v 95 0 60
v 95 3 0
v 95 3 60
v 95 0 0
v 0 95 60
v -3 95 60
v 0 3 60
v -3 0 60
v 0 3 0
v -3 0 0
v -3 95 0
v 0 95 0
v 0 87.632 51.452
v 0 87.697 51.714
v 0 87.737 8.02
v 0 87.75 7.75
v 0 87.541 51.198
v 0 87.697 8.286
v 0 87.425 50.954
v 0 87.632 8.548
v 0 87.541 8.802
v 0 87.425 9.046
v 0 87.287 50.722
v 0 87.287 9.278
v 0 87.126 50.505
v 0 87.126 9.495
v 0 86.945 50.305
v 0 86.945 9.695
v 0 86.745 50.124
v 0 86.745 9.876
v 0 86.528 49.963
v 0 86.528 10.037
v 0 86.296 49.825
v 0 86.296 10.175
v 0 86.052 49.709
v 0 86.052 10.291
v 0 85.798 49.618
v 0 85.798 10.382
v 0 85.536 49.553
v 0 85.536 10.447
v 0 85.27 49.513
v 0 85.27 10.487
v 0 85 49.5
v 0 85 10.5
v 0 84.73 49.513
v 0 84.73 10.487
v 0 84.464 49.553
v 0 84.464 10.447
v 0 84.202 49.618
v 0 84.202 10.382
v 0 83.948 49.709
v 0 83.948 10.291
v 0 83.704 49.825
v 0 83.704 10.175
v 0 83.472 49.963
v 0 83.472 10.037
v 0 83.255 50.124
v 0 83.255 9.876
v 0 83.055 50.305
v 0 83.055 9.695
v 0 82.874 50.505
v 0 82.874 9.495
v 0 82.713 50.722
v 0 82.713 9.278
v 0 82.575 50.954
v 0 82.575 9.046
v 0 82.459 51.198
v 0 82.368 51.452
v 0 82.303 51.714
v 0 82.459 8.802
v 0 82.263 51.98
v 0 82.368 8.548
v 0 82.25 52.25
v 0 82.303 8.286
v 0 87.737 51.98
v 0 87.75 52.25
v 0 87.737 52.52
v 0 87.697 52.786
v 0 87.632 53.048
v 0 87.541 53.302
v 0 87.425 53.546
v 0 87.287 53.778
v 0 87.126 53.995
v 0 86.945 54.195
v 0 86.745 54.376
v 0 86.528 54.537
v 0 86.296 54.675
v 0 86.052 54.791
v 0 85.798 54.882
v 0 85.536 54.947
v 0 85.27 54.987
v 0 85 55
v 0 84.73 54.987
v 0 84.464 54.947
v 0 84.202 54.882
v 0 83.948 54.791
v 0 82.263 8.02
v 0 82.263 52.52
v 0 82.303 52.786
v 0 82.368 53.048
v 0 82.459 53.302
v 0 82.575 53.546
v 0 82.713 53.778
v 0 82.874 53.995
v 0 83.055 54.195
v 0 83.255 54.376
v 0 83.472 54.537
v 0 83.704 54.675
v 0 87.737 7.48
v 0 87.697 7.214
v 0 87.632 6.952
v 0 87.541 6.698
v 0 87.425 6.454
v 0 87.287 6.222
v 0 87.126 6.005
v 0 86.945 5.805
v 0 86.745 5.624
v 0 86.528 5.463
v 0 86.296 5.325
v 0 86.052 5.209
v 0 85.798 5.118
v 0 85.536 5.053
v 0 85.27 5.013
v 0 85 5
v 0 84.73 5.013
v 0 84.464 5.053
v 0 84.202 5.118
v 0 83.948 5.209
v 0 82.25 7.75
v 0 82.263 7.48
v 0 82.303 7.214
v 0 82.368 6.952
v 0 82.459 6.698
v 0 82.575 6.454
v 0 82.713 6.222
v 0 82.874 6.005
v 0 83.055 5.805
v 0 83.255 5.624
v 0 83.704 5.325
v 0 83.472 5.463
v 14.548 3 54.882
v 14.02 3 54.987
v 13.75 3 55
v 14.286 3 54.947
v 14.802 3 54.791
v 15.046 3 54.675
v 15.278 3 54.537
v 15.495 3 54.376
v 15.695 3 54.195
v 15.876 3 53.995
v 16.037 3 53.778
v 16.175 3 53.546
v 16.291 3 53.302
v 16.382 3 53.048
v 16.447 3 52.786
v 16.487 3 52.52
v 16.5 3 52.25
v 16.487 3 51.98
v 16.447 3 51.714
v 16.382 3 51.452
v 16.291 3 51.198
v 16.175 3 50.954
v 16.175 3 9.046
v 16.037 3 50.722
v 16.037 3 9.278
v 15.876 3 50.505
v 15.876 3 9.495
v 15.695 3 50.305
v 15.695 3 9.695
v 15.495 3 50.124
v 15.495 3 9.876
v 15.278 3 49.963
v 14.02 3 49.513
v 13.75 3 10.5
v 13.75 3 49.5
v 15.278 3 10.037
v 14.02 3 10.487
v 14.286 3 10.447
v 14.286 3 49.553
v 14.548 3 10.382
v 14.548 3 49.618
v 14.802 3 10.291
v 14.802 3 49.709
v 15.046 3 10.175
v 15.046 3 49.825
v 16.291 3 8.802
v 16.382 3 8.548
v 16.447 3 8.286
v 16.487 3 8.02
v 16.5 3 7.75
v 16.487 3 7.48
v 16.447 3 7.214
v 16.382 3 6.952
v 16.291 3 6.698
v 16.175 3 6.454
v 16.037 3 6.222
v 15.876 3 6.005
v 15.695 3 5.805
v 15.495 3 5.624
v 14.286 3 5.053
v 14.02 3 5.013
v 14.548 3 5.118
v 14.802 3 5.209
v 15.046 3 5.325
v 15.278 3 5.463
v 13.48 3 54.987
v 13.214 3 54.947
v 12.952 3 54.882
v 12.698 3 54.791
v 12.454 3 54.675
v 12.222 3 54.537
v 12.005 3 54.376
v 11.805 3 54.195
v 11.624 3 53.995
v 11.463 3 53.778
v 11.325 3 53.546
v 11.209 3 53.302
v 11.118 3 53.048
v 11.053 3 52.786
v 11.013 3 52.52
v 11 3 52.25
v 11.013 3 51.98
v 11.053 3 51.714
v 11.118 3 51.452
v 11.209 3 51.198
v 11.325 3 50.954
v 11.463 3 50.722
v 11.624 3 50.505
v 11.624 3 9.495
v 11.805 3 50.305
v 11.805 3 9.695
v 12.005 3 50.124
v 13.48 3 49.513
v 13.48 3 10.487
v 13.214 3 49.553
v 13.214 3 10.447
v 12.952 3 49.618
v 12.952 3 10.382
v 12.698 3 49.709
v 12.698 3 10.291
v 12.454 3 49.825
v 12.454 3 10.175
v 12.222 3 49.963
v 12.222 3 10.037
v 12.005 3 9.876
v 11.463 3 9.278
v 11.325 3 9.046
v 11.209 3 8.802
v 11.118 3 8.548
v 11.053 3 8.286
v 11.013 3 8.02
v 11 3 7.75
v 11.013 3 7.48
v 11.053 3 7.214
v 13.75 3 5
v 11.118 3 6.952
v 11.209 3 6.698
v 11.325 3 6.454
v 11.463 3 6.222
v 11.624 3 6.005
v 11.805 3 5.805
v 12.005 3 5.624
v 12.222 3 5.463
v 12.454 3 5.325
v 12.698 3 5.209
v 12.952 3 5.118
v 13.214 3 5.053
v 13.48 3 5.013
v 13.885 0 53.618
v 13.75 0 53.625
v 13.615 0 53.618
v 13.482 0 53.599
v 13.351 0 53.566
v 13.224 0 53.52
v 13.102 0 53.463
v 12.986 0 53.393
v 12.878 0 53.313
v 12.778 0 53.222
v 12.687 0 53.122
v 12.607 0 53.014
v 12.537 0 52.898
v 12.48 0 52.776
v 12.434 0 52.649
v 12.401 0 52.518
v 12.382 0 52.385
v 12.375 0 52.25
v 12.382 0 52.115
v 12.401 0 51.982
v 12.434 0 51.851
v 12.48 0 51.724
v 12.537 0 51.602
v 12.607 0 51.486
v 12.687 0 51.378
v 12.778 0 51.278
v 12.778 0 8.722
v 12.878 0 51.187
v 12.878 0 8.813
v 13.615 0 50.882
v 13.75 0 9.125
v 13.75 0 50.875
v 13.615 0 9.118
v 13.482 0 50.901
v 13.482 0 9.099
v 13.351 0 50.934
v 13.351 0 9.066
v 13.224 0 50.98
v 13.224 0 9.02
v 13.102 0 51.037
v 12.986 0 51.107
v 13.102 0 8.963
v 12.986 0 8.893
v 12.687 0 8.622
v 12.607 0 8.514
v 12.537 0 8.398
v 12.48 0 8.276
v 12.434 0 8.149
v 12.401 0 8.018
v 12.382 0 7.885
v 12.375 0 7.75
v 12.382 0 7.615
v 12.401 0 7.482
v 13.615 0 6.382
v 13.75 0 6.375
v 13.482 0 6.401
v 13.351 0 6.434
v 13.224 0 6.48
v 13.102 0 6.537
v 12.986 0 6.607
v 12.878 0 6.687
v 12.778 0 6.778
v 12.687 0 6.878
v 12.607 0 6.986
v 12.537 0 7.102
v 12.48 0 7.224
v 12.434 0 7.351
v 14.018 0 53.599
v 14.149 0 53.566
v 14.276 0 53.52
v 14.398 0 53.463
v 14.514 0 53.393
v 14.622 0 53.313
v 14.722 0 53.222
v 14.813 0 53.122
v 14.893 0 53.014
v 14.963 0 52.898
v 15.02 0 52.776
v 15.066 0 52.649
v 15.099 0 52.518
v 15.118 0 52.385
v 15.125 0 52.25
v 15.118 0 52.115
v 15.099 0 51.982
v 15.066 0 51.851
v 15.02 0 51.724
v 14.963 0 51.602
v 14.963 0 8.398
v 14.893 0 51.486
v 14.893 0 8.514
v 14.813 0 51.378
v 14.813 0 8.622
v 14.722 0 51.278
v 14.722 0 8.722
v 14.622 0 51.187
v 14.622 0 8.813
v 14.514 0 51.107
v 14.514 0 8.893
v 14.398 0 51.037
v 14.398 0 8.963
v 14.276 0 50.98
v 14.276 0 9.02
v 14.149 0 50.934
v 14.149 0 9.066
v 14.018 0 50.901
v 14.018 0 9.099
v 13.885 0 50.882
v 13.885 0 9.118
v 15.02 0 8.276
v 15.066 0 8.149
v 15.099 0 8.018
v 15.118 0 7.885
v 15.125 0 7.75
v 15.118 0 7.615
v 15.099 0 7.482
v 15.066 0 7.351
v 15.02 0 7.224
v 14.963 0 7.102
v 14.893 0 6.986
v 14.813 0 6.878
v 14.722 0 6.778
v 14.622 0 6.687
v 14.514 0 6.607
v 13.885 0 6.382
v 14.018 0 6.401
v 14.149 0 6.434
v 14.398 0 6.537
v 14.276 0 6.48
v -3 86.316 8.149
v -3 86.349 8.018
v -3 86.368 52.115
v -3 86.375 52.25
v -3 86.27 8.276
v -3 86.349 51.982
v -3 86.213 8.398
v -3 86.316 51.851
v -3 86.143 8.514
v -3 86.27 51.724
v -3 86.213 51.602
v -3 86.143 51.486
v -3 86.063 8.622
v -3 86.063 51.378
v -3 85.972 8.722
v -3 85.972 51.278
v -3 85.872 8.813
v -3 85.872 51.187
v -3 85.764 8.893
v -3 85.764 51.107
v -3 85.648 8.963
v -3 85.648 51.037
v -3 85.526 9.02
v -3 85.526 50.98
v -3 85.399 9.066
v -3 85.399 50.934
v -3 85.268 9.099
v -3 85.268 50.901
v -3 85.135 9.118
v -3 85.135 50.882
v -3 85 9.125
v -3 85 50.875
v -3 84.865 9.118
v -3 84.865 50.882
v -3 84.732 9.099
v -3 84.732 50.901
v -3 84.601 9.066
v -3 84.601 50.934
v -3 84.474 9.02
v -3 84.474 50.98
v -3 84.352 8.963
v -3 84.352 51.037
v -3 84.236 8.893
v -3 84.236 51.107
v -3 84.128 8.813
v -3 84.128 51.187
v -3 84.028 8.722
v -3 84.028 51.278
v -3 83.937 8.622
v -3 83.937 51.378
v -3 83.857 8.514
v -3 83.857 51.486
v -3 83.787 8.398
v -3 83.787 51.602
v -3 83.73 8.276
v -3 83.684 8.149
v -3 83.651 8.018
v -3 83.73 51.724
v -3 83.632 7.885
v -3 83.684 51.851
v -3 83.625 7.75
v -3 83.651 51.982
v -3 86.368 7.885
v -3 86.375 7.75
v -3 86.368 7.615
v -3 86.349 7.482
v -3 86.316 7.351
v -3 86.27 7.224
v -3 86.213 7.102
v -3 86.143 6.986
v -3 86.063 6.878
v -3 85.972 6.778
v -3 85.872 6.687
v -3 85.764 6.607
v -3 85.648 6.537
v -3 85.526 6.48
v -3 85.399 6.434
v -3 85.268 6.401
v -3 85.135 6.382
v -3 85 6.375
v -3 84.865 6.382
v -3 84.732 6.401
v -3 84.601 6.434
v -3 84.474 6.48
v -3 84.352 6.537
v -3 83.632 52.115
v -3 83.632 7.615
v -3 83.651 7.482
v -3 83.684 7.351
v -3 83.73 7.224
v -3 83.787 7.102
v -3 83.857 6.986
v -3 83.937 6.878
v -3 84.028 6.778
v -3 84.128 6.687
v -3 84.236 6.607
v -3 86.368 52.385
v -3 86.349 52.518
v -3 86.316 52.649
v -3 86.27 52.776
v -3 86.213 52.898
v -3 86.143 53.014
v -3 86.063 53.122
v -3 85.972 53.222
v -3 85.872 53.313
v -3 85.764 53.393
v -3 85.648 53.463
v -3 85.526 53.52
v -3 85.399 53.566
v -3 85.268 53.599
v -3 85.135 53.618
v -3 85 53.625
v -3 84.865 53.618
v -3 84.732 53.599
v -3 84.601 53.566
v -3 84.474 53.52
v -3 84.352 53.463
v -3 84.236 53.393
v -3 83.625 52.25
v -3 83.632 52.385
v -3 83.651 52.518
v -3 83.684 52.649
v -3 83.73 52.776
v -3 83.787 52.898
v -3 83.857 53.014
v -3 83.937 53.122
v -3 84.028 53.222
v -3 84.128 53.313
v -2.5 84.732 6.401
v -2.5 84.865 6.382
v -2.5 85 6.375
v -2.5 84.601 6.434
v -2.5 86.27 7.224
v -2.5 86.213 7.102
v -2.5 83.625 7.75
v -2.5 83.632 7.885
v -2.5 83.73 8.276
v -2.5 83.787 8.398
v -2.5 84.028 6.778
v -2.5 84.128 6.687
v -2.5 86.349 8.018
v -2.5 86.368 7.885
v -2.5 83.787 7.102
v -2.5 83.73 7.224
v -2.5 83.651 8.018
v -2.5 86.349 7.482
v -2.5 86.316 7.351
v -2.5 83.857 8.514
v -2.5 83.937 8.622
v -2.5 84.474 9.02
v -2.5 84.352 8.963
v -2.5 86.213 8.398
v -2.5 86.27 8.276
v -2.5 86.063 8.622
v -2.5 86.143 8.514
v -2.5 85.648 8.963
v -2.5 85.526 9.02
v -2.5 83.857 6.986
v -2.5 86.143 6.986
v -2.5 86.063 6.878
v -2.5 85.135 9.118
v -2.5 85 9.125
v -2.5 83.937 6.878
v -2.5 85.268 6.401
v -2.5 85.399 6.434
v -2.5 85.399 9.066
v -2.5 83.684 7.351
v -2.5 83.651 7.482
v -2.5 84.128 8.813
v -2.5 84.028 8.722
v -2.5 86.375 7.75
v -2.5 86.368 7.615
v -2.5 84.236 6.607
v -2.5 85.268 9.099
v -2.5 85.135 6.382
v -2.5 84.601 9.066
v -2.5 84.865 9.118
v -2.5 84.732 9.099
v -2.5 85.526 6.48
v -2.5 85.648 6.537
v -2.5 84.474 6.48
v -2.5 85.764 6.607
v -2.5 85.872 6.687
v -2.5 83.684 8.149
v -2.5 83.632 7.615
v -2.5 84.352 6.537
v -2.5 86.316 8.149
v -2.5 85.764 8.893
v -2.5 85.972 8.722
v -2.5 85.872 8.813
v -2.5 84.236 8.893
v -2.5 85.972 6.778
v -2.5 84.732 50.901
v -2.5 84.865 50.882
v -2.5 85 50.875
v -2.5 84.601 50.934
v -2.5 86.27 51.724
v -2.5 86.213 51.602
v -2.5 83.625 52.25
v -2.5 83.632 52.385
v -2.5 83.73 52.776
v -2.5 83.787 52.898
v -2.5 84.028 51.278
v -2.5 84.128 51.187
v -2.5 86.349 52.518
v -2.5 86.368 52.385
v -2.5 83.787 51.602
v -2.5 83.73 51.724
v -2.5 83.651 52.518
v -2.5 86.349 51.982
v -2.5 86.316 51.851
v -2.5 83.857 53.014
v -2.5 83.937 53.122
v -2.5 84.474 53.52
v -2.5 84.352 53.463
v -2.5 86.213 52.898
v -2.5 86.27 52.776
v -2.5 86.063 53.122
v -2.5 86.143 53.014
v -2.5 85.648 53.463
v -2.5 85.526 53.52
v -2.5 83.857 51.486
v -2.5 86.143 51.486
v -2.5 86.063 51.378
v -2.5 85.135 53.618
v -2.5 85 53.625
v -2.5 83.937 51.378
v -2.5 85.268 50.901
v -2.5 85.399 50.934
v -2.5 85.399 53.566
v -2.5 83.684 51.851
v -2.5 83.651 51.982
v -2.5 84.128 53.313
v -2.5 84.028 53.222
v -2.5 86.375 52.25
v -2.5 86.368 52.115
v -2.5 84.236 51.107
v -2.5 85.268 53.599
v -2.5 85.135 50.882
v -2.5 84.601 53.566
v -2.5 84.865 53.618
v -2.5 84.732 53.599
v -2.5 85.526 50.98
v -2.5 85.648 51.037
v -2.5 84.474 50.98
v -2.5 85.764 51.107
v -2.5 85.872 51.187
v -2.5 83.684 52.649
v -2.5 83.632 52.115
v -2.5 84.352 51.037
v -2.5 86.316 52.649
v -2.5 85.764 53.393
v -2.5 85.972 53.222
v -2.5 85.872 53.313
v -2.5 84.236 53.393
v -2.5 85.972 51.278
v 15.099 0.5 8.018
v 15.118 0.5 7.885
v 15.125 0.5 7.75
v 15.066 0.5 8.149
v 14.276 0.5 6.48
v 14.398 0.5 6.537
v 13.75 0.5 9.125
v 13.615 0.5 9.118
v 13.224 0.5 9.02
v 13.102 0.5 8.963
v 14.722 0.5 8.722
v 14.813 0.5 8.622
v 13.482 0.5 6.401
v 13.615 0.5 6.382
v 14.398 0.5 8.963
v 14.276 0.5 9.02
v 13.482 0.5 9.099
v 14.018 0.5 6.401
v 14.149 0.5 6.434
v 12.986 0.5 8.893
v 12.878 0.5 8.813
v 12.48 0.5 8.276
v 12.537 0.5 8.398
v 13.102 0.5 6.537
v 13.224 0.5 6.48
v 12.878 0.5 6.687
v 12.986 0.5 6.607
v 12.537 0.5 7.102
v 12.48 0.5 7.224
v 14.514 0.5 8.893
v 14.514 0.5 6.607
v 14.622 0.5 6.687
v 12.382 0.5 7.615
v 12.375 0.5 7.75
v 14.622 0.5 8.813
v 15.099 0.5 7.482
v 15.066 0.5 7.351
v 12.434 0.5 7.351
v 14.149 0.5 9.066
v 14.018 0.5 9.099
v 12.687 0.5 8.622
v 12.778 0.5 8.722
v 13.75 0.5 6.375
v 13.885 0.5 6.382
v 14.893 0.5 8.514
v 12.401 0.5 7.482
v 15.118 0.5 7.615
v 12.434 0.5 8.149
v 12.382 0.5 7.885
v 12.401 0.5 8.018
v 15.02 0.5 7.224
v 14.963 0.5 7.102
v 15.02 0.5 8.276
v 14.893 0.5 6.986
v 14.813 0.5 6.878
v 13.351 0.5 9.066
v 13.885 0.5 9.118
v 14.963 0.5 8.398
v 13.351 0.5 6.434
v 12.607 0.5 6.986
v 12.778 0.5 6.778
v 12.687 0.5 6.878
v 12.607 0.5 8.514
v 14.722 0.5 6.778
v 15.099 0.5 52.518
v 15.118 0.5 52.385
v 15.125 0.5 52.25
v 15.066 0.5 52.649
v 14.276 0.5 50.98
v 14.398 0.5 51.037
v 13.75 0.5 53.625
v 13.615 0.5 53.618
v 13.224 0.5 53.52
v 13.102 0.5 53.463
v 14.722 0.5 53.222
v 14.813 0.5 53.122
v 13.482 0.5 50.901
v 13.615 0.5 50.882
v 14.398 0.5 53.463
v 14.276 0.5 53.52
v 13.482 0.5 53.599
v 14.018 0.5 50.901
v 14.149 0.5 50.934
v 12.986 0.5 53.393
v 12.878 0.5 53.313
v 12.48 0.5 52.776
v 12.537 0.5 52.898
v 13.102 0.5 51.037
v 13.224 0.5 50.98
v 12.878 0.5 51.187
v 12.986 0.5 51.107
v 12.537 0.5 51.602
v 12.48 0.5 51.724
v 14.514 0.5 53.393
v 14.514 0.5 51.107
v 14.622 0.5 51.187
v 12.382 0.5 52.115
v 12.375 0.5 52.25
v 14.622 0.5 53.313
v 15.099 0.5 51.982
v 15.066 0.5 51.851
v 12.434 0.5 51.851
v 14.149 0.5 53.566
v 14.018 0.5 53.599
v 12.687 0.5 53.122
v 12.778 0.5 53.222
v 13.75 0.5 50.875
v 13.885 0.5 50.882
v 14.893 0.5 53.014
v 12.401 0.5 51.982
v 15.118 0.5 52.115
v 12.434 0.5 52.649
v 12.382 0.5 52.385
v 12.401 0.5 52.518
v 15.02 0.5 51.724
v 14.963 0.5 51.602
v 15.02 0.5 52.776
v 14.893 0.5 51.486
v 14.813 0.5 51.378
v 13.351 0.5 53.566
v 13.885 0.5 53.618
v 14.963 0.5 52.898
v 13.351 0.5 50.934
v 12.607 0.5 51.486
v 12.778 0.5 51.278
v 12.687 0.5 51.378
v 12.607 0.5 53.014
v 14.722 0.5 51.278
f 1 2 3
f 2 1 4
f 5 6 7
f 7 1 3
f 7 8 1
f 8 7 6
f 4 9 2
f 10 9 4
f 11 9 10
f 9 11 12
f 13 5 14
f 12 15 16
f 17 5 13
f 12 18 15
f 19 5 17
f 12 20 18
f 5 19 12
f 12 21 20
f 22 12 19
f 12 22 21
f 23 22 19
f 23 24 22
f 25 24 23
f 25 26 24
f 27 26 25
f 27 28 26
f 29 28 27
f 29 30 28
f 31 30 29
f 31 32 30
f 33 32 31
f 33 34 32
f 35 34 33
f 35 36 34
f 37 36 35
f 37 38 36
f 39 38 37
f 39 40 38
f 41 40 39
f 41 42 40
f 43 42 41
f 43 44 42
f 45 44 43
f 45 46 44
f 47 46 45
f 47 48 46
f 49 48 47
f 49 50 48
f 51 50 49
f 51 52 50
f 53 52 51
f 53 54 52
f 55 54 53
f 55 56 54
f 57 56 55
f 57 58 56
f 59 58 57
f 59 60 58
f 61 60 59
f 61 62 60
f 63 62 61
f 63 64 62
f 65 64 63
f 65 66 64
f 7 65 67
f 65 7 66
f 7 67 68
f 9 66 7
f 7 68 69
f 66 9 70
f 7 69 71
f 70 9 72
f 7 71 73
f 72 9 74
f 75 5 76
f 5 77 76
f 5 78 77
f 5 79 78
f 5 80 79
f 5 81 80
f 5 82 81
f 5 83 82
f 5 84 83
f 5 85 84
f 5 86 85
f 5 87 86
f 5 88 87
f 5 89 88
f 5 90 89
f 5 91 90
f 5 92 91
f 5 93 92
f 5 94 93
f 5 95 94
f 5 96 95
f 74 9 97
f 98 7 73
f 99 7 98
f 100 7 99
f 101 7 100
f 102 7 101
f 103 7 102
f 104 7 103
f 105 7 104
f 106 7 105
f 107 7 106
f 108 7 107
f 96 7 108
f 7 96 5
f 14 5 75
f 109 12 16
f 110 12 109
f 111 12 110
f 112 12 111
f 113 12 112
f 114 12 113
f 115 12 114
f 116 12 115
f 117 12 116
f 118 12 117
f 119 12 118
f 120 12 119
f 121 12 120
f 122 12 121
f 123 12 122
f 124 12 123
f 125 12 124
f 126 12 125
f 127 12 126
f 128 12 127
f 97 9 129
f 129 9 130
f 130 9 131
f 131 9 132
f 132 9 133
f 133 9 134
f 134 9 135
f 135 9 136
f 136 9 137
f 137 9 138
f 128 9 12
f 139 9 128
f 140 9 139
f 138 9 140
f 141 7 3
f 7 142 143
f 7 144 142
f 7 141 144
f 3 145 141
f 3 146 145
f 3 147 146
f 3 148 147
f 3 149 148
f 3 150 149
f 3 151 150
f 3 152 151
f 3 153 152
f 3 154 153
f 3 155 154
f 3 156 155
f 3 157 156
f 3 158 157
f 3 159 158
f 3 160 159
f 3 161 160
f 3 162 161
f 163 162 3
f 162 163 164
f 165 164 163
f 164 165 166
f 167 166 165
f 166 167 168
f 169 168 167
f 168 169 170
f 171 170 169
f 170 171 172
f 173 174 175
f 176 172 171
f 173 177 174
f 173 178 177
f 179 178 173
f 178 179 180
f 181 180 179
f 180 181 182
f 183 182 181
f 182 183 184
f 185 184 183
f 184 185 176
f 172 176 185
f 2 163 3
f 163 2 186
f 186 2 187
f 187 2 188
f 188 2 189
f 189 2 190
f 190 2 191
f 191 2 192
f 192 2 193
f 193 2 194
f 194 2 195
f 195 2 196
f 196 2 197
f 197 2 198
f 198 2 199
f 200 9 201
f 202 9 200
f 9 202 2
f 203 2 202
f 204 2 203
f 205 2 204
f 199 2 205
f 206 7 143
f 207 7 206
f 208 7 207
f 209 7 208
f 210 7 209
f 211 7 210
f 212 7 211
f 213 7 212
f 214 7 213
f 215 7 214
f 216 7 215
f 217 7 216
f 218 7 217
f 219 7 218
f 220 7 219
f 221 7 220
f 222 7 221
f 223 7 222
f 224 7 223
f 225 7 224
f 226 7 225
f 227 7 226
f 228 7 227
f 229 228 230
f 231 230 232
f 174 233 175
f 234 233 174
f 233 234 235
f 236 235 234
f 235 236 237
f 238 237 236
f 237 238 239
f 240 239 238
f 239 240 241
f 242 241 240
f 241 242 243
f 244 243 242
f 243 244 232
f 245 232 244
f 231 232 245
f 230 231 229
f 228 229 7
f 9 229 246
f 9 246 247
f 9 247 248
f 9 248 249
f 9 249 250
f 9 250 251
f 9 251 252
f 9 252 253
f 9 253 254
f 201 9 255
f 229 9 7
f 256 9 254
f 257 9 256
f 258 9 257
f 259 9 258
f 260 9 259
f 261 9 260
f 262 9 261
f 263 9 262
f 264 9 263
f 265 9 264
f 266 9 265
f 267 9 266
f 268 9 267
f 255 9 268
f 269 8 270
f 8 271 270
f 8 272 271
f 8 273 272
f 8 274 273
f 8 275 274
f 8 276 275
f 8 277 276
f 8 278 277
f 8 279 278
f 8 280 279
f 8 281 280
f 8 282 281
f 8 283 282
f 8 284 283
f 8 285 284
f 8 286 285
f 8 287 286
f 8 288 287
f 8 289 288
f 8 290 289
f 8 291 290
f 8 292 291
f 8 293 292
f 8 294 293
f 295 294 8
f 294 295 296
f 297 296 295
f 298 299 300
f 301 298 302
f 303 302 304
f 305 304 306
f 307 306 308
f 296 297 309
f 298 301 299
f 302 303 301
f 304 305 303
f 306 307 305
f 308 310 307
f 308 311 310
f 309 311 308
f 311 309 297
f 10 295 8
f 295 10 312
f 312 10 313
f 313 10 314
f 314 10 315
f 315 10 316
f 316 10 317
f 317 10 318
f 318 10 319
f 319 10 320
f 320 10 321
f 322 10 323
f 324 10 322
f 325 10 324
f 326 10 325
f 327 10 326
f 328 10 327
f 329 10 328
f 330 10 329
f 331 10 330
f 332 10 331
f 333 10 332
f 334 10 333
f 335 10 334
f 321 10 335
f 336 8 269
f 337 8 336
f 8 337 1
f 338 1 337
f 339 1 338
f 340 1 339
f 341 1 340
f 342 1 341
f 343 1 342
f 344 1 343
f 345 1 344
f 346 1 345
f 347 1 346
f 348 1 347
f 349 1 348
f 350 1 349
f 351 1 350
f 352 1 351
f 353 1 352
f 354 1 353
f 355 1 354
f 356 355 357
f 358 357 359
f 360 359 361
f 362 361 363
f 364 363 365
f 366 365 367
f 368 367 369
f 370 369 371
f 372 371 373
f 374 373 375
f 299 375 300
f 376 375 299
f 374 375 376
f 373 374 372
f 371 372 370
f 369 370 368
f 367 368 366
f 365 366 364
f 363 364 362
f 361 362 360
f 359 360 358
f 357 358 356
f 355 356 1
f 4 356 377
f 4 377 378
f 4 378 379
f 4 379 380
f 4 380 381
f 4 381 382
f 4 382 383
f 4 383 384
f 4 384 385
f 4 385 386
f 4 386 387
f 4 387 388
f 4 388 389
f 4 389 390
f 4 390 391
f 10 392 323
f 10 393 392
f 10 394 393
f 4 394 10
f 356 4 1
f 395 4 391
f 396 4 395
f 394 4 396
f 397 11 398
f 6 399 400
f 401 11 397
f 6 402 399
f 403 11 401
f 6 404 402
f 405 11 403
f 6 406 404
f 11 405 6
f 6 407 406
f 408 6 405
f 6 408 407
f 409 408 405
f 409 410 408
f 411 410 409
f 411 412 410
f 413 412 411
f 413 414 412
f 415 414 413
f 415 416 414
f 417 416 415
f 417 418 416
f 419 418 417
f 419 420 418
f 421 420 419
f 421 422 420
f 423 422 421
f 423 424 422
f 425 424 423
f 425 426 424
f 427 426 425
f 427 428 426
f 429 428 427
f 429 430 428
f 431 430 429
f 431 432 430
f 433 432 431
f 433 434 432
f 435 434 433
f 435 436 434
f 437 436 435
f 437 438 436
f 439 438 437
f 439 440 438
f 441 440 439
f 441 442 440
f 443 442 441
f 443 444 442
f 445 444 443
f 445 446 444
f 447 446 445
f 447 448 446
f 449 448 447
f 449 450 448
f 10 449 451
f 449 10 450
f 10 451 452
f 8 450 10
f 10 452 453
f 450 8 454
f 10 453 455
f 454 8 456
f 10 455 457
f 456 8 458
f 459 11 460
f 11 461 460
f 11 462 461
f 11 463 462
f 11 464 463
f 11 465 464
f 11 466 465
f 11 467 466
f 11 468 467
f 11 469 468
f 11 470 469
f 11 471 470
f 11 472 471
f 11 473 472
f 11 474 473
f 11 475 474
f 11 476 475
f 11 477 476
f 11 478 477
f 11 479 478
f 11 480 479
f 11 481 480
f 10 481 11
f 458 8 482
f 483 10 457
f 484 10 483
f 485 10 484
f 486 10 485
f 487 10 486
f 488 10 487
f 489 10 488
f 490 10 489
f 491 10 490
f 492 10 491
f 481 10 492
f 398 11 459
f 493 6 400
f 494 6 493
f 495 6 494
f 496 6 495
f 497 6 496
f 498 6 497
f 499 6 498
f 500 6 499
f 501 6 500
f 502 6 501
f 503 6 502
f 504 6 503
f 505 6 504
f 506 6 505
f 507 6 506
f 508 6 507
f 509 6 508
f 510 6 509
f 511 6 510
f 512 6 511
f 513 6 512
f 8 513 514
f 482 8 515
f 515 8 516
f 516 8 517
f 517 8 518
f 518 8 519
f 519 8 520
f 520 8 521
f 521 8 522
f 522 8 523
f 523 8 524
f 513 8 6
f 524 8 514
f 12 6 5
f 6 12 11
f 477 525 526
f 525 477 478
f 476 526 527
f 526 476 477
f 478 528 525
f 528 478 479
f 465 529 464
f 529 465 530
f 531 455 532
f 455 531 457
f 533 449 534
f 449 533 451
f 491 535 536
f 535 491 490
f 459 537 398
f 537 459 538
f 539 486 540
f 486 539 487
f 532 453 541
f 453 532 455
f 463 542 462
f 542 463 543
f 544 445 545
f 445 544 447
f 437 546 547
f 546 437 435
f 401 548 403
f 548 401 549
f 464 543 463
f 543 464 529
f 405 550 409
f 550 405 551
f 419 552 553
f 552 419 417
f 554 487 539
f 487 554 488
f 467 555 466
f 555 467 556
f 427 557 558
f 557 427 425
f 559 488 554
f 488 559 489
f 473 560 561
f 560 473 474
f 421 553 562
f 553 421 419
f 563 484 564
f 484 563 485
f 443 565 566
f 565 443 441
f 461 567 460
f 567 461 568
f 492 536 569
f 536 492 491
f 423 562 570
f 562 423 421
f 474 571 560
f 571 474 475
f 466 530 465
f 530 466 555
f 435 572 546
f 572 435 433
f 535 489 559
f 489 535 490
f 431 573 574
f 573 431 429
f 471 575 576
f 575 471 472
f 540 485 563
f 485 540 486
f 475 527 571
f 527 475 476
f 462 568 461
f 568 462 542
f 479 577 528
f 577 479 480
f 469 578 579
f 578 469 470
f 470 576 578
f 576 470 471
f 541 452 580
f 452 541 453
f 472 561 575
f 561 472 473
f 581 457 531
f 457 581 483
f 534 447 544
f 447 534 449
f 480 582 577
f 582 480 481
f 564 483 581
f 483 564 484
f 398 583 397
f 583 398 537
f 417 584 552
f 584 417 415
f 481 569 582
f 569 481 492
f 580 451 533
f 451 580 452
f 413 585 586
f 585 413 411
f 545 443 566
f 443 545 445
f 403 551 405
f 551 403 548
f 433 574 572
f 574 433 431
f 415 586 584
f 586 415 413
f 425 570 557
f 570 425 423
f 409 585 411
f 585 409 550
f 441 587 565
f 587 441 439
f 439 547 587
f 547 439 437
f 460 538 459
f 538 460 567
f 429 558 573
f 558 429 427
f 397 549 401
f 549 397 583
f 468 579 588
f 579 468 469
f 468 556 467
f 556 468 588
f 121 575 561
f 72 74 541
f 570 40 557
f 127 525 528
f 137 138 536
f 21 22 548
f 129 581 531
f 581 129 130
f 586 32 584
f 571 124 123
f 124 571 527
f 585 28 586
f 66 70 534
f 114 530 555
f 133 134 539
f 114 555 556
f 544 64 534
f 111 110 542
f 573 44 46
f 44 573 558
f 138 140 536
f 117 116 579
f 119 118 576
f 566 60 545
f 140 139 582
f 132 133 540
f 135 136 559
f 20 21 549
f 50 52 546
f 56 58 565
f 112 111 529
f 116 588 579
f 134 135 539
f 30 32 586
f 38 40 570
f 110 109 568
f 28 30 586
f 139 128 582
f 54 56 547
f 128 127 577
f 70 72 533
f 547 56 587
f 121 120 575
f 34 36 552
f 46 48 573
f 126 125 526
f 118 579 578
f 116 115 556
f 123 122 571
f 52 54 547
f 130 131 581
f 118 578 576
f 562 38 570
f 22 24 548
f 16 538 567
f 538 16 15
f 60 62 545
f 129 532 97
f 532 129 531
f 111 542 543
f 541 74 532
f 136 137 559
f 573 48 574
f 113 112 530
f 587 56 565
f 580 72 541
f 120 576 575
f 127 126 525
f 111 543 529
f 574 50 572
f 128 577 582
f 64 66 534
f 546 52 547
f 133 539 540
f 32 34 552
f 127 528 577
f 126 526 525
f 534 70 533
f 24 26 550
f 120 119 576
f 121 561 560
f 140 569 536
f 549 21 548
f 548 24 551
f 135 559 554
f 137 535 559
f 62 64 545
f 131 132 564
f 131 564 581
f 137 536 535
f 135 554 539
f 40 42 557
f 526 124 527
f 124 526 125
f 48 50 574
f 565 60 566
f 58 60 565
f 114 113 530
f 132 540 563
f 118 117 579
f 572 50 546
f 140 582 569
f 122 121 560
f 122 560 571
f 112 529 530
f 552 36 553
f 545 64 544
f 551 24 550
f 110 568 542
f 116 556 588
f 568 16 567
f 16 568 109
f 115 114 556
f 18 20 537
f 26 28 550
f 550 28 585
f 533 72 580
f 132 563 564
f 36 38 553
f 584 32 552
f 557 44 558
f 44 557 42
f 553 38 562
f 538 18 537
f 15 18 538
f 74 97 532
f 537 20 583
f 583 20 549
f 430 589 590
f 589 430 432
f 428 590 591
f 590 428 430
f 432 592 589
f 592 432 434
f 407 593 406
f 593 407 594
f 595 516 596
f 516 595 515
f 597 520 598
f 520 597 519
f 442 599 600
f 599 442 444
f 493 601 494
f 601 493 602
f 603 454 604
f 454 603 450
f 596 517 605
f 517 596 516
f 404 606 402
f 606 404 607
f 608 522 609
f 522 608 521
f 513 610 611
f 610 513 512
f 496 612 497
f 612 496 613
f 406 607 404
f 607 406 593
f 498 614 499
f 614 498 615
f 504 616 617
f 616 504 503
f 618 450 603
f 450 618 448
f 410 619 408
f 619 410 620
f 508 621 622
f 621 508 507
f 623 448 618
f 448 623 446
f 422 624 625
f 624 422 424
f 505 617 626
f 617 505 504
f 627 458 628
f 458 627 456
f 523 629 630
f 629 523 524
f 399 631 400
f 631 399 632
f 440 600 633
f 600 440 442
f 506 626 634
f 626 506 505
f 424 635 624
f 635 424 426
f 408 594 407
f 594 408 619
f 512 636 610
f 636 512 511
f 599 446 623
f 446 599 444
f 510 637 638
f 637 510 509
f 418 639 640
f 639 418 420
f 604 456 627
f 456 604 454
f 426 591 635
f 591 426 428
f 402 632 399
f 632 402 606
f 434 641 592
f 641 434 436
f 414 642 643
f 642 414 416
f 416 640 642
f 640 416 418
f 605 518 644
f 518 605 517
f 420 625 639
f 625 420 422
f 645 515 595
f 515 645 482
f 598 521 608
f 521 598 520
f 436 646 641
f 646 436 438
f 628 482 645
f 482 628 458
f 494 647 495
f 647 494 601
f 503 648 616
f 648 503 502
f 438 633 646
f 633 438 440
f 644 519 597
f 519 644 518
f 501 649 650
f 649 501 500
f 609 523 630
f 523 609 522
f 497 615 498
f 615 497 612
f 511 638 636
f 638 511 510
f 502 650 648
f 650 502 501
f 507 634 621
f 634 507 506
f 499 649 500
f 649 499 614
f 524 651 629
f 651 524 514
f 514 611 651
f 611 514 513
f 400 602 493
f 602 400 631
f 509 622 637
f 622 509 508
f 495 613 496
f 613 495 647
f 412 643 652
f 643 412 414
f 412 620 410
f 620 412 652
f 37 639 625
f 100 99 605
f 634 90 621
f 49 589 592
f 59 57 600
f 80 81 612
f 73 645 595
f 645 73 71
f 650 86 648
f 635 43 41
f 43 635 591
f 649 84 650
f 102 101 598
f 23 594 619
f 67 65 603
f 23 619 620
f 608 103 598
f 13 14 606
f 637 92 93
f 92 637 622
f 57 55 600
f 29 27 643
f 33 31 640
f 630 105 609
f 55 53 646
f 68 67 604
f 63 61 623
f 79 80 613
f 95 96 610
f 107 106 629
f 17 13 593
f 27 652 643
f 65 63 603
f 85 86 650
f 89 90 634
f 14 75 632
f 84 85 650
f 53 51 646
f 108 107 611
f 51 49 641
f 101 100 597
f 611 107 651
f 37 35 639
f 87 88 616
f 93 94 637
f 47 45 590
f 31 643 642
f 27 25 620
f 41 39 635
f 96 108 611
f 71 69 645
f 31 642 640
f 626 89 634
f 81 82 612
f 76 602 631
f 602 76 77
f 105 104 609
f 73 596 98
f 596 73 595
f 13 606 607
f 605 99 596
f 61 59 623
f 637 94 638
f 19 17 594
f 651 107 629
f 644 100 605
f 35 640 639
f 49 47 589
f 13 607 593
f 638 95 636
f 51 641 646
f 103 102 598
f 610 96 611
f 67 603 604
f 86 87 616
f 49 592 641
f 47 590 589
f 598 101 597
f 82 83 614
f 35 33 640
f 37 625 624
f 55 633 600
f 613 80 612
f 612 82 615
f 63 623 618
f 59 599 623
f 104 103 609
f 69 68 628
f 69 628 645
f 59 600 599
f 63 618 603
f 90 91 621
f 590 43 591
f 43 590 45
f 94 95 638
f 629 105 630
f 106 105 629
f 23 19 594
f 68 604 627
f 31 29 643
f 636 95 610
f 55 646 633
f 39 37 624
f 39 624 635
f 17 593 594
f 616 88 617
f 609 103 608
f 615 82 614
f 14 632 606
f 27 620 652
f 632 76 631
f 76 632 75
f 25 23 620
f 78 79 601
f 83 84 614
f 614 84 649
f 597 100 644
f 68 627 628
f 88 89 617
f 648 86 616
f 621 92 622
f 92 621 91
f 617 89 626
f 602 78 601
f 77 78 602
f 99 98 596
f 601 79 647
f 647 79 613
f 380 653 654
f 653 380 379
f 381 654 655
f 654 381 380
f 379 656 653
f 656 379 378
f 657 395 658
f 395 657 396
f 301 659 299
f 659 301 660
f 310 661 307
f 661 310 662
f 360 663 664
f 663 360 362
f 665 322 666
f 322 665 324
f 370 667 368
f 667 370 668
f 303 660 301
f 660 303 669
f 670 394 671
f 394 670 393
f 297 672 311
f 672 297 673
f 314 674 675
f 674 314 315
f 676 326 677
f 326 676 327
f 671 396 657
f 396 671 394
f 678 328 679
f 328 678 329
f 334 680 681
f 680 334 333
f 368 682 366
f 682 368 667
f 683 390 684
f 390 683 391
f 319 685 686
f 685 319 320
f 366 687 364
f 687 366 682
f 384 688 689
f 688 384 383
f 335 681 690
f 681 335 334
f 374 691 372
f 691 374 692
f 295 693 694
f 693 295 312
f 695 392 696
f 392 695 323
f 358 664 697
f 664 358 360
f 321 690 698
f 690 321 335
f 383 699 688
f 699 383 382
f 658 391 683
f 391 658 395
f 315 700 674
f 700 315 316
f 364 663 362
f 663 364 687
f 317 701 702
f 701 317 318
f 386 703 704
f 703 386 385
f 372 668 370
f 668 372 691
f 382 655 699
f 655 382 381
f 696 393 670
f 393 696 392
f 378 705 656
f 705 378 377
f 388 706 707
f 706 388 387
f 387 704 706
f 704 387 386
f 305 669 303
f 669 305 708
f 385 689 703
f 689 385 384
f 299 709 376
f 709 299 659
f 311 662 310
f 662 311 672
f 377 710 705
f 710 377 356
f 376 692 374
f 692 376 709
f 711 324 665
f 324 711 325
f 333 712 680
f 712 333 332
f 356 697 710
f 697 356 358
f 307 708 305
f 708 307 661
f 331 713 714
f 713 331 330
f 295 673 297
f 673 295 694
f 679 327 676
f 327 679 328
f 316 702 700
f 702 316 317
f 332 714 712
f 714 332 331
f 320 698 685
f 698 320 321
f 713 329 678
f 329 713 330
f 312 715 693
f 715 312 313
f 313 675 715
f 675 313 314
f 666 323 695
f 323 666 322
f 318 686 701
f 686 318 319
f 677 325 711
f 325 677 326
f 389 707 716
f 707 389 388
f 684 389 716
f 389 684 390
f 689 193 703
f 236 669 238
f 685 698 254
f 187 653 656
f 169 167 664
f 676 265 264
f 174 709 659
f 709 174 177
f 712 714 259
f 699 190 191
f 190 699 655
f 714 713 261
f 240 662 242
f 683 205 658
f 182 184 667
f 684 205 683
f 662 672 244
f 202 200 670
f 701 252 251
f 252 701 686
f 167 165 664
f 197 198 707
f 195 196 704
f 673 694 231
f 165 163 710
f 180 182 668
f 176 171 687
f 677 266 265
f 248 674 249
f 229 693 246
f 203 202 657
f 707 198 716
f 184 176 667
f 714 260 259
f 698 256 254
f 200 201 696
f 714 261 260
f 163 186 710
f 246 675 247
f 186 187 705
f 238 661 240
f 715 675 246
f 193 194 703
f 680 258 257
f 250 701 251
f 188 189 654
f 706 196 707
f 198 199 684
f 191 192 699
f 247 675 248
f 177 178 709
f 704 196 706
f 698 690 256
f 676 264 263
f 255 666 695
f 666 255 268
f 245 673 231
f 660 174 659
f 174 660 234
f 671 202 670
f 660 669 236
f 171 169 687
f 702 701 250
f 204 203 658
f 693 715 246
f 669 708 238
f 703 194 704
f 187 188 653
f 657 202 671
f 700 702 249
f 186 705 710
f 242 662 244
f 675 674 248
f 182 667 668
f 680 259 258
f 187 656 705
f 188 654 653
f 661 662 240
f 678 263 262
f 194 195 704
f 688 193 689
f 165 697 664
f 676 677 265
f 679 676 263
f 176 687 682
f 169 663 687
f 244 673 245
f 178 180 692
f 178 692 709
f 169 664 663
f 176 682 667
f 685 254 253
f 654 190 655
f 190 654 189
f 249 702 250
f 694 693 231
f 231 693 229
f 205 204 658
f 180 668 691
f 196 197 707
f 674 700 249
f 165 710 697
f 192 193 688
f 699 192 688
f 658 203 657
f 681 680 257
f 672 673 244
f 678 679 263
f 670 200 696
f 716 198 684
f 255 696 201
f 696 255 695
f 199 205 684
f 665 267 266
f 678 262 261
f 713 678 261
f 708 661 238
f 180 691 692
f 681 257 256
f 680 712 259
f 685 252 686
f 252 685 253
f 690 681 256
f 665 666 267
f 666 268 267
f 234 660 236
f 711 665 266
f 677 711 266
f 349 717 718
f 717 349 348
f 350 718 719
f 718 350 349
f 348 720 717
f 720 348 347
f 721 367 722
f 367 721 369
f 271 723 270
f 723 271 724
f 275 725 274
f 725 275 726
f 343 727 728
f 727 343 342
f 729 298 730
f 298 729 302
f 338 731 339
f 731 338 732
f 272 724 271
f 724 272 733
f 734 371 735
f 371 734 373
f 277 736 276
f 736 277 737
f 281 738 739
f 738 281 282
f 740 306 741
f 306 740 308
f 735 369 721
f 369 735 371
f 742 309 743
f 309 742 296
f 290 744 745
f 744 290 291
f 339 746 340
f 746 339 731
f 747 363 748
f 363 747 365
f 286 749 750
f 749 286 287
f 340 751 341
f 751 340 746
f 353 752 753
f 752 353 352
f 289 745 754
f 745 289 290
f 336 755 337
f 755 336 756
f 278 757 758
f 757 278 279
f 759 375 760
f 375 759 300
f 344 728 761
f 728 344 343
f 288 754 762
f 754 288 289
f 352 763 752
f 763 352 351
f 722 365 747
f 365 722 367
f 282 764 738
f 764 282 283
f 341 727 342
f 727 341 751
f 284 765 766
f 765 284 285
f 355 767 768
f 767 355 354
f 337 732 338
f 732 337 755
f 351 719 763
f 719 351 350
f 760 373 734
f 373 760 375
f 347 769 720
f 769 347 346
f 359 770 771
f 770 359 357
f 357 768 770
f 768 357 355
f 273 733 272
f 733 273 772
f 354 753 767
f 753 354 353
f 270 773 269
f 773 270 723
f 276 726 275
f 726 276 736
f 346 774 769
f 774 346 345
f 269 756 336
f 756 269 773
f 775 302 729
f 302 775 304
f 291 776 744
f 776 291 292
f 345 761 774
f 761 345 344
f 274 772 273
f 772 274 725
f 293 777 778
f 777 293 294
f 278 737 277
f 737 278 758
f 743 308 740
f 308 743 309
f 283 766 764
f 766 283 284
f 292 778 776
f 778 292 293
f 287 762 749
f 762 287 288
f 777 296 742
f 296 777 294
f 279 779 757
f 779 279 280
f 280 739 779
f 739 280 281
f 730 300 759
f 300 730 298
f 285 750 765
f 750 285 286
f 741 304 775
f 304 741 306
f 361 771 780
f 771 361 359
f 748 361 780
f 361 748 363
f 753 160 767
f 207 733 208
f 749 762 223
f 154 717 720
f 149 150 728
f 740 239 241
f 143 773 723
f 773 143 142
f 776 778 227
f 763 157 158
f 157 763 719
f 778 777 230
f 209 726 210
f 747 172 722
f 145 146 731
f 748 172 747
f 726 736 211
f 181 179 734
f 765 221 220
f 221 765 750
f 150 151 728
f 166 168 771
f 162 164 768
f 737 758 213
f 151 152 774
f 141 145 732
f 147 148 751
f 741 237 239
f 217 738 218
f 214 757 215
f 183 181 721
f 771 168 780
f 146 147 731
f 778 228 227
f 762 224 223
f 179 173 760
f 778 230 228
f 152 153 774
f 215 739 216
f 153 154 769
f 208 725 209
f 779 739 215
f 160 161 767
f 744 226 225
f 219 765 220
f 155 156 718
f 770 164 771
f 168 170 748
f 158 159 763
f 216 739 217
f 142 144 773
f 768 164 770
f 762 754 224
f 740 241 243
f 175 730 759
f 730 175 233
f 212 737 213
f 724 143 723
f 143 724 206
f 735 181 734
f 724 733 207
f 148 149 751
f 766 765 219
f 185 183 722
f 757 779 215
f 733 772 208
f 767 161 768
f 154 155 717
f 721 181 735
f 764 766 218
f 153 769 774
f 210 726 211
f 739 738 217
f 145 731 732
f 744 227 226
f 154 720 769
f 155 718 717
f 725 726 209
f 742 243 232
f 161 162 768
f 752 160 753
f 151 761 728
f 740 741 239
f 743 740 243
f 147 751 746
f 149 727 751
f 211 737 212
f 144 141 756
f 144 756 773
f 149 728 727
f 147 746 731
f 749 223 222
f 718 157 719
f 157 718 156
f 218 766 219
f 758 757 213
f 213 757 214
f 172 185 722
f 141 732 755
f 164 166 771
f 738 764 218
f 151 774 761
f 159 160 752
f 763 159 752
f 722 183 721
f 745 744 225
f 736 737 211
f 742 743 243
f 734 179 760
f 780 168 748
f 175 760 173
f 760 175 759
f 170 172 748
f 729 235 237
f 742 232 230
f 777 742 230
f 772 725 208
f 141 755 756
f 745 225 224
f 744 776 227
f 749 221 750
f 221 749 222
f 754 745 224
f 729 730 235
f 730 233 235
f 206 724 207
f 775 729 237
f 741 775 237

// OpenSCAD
// L-shaped tapered cover
// Units: mm

$fn = 64;

// Base L dimensions (top face)
thickness = 3;
leg_length_x = 95;
leg_length_y = 95;
leg_width = 60;

// Corner brace
support_x = 10;
support_y = 30;


// screw size
screw_diameter = 2.75;
screw_head = 5.5;
screw_head_depth = 2.5;
screw_from_edge = 5 + (screw_head / 2);
screw_from_support = support_x + (screw_head / 2) + 1;

// taper
taper_width = 10;
taper_length = leg_length_x - support_x - screw_from_edge - screw_head;

module screw_hole() {
  union() {
    cylinder(h=thickness, d=screw_diameter);
    cylinder(h=screw_head_depth, d2=screw_diameter, d1=screw_head);
  }  
}

module taper() {
  polyhedron(points=[
      [0, 0, 0],
      [0, thickness, taper_width],
      [0, thickness, 0],
      [taper_length, 0, 0],
      [taper_length, thickness, taper_width],
      [taper_length, thickness, 0]
    ],
    faces=[
      [0, 1, 2],
      [0, 1, 4, 3],
      [0, 2, 5, 3],
      [1, 2, 5, 4],
      [3, 4, 5]
    ]);
}

difference() {
  union() {
    // X leg
    cube([leg_length_x, thickness, leg_width]);

    // Y leg
    rotate(90)
    cube([leg_length_y, thickness, leg_width]);
    
    // Corner brace
    translate([0, thickness, 0])
    polyhedron(points=[
      [0, 0, 0],
      [support_x, 0, 0],
      [0, support_y, 0],
      [0, 0, leg_width],
      [support_x, 0, leg_width],
      [0, support_y, leg_width]
    ],
    faces=[
      [0, 1, 2],
      [0, 1, 4, 3],
      [0, 2, 5, 3],
      [1, 2, 5, 4],
      [3, 4, 5]
    ]);
  }

  // bottom y hole
  translate([0, leg_length_y - 10, screw_from_edge])
  rotate(a=[0, 90, 180])
  screw_hole();

  // top y hole
  translate([0, leg_length_y - 10, leg_width - screw_from_edge])
  rotate(a=[0, 90, 180])
  screw_hole();

  // bottom x hole
  translate([screw_from_support, thickness, screw_from_edge])
  rotate(a=[90, 0, 0])
  screw_hole();

  // top x hole
  translate([screw_from_support, thickness, leg_width - screw_from_edge])
  rotate(a=[90, 0, 0])
  screw_hole();

  // bottom taper
  translate([leg_length_x - taper_length, 0, 0])
  taper();
  // top taper
  translate([leg_length_x, 0, leg_width])
  rotate([180, 0, 180])
  taper();
}
